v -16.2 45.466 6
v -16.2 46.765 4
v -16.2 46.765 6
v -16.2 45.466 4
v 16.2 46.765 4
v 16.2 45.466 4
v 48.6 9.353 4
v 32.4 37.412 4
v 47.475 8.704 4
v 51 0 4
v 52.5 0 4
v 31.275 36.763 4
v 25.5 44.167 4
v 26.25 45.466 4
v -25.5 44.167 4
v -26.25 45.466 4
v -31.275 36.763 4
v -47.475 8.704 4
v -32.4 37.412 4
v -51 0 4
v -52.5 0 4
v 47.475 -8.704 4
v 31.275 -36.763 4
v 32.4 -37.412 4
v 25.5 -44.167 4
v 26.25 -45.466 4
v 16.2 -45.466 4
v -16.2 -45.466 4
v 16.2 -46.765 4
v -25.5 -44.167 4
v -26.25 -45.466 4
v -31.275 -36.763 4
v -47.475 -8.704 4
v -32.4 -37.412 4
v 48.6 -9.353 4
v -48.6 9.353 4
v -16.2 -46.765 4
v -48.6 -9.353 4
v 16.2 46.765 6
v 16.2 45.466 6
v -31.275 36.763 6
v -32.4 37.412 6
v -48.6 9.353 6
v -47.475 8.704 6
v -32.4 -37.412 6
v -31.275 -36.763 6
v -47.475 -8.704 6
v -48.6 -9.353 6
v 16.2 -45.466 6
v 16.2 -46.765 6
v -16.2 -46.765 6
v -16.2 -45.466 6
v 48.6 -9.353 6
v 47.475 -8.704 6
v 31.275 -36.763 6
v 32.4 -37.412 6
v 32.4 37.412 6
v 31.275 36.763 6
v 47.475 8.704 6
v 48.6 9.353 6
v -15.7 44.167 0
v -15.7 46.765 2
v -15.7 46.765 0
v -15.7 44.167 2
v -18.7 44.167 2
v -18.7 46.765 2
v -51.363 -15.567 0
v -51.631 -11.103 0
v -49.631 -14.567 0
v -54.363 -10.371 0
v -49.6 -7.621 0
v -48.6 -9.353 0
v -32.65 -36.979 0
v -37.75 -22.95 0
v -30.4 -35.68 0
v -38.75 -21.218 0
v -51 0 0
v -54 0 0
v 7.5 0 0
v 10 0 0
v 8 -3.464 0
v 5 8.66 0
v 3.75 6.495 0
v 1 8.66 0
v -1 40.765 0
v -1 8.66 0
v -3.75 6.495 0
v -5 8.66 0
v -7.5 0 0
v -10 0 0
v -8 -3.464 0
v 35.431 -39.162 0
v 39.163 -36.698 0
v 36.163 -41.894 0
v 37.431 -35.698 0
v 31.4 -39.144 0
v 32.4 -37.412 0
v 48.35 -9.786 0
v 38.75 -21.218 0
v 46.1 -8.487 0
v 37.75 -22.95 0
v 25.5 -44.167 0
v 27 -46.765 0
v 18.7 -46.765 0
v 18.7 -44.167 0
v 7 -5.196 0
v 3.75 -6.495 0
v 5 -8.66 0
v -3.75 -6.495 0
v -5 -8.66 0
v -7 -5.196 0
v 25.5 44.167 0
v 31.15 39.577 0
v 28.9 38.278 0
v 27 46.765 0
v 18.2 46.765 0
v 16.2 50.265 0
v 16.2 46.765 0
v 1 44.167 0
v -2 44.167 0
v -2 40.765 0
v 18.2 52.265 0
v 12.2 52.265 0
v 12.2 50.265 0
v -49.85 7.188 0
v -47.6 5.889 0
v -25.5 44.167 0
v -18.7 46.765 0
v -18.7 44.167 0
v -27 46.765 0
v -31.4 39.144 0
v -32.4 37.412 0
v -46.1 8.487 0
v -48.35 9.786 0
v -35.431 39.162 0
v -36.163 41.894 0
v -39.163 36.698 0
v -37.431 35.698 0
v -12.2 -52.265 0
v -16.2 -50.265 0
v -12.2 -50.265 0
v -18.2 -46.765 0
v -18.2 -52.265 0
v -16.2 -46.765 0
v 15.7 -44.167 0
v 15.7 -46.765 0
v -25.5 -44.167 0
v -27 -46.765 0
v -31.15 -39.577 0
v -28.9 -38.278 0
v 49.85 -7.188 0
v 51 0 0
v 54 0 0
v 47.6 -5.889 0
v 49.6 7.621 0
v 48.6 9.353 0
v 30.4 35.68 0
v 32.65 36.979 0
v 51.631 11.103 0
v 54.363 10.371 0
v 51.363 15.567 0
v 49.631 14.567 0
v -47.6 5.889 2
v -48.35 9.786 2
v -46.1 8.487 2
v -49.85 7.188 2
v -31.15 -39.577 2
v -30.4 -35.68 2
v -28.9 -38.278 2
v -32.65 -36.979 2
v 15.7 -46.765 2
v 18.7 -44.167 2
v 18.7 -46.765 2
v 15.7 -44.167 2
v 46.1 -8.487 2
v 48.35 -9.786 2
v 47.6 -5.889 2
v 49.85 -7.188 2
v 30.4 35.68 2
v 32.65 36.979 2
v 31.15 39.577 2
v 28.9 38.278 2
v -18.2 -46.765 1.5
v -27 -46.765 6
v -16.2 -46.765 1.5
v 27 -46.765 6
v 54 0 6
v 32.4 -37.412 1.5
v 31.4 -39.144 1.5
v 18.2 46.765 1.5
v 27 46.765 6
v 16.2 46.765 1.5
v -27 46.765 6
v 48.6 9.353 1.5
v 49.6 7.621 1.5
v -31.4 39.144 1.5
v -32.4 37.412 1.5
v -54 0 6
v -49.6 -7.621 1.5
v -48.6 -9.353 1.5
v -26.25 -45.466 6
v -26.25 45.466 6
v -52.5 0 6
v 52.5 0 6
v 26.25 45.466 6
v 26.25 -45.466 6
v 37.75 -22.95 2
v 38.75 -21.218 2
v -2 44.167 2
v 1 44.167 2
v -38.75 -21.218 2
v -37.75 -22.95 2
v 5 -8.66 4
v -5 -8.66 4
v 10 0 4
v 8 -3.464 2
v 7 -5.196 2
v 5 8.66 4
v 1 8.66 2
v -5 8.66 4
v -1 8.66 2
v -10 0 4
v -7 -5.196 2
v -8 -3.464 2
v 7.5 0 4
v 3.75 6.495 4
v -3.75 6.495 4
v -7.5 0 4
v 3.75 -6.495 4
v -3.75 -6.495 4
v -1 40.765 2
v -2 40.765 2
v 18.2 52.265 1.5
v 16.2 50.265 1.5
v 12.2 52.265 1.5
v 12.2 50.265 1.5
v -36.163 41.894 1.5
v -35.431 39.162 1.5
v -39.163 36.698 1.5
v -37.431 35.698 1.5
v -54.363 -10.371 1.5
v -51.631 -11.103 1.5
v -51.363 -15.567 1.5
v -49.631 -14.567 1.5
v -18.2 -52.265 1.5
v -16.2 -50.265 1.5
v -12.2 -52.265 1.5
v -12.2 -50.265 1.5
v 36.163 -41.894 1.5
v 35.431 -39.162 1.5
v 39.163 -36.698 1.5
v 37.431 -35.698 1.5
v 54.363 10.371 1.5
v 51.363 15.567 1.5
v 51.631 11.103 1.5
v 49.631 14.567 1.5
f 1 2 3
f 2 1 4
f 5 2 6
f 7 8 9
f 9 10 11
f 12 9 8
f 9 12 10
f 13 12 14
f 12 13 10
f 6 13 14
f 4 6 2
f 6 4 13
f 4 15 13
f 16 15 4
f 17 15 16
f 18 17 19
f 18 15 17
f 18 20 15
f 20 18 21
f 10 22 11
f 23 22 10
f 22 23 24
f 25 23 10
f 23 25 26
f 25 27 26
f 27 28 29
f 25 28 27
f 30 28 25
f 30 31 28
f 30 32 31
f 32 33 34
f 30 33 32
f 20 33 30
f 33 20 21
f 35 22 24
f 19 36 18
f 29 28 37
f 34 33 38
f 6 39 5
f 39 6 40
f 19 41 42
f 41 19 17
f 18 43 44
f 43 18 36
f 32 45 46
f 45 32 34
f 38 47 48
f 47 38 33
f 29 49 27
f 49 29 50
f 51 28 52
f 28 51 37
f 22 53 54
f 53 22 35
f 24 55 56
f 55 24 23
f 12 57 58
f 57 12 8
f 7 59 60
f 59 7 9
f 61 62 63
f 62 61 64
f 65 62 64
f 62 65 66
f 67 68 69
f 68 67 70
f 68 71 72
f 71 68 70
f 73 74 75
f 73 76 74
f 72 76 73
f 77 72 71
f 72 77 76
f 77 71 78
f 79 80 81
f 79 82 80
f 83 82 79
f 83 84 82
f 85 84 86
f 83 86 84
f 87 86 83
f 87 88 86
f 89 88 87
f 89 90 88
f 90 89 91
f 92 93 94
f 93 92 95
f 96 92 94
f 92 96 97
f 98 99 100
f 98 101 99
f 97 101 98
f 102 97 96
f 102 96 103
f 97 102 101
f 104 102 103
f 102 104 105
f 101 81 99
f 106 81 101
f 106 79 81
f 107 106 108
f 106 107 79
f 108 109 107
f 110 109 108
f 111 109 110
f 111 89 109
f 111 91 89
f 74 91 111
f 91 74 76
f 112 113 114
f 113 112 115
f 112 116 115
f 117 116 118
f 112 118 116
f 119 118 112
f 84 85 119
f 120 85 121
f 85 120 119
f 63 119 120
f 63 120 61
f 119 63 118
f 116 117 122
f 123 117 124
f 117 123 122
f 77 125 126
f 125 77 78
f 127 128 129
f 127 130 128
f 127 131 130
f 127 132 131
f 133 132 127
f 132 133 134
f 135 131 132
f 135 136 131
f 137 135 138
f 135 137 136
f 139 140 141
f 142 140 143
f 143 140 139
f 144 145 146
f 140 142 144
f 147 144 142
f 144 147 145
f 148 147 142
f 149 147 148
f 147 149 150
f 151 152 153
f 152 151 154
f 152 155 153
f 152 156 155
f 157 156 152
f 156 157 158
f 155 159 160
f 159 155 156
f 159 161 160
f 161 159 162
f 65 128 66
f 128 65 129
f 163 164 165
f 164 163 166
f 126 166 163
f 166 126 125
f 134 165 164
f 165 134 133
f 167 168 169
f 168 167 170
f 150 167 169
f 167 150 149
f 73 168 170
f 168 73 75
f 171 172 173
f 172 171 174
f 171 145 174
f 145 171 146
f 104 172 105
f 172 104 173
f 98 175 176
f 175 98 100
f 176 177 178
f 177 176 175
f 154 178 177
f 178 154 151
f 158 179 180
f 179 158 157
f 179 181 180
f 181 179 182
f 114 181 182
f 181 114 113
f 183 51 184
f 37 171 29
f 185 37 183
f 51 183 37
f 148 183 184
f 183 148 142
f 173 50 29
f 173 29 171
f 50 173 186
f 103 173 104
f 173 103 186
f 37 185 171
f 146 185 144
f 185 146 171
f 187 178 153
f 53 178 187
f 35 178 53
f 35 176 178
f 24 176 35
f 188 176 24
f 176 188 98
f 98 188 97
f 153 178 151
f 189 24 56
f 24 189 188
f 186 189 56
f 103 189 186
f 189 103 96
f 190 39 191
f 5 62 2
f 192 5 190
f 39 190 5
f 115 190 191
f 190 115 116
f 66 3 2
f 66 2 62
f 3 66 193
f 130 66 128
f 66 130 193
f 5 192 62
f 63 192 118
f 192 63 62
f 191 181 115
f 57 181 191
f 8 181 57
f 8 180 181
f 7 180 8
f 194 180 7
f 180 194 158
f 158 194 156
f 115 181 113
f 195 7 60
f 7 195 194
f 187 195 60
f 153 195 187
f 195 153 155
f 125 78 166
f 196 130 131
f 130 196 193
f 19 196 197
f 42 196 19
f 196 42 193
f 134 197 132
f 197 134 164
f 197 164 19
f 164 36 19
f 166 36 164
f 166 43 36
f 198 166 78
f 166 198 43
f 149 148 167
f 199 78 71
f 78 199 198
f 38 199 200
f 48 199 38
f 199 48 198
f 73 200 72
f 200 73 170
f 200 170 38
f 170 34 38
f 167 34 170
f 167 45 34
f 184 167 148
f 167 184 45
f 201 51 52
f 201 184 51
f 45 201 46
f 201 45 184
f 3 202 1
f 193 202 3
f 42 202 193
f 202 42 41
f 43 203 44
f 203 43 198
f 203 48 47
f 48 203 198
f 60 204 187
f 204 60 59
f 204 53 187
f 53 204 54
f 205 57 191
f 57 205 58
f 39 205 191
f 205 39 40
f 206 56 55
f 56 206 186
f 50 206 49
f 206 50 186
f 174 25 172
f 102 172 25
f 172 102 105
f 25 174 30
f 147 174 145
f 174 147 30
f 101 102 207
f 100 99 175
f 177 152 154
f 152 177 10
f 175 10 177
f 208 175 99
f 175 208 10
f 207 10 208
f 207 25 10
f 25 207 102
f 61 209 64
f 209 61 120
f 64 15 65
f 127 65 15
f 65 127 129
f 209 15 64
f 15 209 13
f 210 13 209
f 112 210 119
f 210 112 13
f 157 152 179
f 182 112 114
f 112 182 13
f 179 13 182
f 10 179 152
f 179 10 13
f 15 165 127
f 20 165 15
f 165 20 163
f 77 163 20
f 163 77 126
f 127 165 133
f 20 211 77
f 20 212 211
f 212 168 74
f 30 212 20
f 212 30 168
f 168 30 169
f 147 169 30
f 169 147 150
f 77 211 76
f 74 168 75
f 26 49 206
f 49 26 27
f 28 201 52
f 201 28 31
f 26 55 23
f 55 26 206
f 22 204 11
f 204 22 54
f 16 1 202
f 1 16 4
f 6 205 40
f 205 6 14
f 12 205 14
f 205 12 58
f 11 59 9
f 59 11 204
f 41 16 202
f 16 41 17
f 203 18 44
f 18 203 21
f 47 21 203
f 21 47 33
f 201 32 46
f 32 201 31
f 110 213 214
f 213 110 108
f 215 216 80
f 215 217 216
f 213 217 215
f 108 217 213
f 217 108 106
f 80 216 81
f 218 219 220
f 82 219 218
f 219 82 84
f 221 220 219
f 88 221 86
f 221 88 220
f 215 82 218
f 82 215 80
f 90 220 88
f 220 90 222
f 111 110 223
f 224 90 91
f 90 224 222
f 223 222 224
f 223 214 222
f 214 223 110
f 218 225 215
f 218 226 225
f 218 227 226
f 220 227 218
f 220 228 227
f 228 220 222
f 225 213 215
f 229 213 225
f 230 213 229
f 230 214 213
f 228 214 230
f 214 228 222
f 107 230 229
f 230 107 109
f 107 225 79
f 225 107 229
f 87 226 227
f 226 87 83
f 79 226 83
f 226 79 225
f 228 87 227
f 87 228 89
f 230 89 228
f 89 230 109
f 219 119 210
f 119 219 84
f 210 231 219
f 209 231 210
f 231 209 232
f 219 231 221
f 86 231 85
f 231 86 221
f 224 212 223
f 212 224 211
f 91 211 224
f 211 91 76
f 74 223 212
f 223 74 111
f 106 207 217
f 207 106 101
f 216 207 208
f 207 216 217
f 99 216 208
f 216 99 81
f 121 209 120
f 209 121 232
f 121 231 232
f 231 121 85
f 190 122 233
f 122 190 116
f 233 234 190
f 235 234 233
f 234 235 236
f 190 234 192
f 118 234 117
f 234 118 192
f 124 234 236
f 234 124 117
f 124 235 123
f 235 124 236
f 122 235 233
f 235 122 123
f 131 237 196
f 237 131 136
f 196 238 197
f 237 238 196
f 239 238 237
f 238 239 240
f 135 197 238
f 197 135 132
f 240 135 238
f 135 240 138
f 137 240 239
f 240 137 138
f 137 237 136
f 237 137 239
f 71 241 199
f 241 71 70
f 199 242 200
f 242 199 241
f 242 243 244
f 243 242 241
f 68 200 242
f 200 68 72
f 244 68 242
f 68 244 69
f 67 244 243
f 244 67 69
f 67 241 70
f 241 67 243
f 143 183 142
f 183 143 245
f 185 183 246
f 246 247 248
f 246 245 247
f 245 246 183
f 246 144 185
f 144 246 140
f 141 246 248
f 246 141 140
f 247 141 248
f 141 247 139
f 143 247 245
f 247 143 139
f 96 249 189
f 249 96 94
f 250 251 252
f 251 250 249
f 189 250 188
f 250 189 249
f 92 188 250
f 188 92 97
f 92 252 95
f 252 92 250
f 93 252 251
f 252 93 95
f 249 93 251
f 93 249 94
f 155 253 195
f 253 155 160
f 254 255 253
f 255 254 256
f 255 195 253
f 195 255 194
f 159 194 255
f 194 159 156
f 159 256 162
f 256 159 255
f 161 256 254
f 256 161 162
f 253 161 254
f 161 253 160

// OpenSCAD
base_hex_r = 54;
base_hex_d = base_hex_r*2;
base_hex_edge = base_hex_r;
base_hex_half_tri=(base_hex_r/2.0)*sqrt(3.0);
base_edge_w=3;
filet_length=base_hex_edge/2.5;
tab_w=2;
tab_h=1.5;
base_hex_h=4;

echo(base_hex_r);
echo(base_hex_d);
echo(base_hex_edge);
echo(base_hex_half_tri);

module eclipse_hex () {

  // Draw base hex
  difference() {
    cylinder(h=base_hex_h+2,d=base_hex_d,$fn=6);
    // Clear center
    cylinder(h=6,d=base_hex_d-2*base_edge_w,$fn=6);
    // Cut out ledge
    translate([0,0,base_hex_h]) {
      cylinder(h=base_hex_h,d=base_hex_d-base_edge_w,$fn=6);
    }
    // Cut out top ledge so corner filets
    // hold card
    translate([0,0,base_hex_h]) {
      for(i=[0:5]) {
        rotate([0,0,60*i]) {
          translate([0,base_hex_half_tri-base_edge_w/2,0]) {
            top_edge_cut();
          }
        }
      }
    }

    // Negative tabs - slightly larger
    for(k=[0:5]) {
      rotate([0,0,60*k]) {
        neg_tab();
      }
    }
  }
  // Provide some center support
  center_support();

  // Positive tabs
  for(k=[0:5]) {
    rotate([0,0,60*k]) {
      tab();
    }
  }
}

module neg_tab() {
  translate([-base_hex_edge/2+filet_length/2-tab_w-0.5,base_hex_half_tri-base_edge_w*2-1,0]) {
    cube([tab_w+1,base_edge_w*2+2,tab_h+0.5]);
  }
}

module tab() {
  translate([base_hex_edge/2-filet_length/2,base_hex_half_tri,0]) {
    cube([tab_w,base_edge_w+0.5,tab_h]);
  }
  translate([base_hex_edge/2-filet_length/2-4,base_hex_half_tri+base_edge_w+0.5,0]) {
    cube([6,tab_w,tab_h]);
  }
}

// Support for the card in the center
module center_support() {
  difference() {
    cylinder(h=base_hex_h,d=20,$fn=6);
    cylinder(h=base_hex_h,d=15,$fn=6);
  }
  for (j=[0:2]) {
    rotate([0,0,120*j]) {
      translate([-1,8,0]) {
        cube([2,base_hex_half_tri-9,base_hex_h/2]);
      }
    }
  }
  translate([-2,base_hex_half_tri-base_edge_w*2,0]) {
    cube([2,4,base_hex_h/2]);
  }
}


// Cubic cut out to reduce material on
// top outer edge so just corner filets
// hold hex card
module top_edge_cut() {
  rotate([0,0,90]) {
    translate([0,-(base_hex_edge-filet_length)/2,0]) {
      cube([base_edge_w,base_hex_edge-filet_length,4]);
    }
  }
}

eclipse_hex();
//translate([0,-base_hex_half_tri*2-0.5,0]) {
//  eclipse_hex();
//}
